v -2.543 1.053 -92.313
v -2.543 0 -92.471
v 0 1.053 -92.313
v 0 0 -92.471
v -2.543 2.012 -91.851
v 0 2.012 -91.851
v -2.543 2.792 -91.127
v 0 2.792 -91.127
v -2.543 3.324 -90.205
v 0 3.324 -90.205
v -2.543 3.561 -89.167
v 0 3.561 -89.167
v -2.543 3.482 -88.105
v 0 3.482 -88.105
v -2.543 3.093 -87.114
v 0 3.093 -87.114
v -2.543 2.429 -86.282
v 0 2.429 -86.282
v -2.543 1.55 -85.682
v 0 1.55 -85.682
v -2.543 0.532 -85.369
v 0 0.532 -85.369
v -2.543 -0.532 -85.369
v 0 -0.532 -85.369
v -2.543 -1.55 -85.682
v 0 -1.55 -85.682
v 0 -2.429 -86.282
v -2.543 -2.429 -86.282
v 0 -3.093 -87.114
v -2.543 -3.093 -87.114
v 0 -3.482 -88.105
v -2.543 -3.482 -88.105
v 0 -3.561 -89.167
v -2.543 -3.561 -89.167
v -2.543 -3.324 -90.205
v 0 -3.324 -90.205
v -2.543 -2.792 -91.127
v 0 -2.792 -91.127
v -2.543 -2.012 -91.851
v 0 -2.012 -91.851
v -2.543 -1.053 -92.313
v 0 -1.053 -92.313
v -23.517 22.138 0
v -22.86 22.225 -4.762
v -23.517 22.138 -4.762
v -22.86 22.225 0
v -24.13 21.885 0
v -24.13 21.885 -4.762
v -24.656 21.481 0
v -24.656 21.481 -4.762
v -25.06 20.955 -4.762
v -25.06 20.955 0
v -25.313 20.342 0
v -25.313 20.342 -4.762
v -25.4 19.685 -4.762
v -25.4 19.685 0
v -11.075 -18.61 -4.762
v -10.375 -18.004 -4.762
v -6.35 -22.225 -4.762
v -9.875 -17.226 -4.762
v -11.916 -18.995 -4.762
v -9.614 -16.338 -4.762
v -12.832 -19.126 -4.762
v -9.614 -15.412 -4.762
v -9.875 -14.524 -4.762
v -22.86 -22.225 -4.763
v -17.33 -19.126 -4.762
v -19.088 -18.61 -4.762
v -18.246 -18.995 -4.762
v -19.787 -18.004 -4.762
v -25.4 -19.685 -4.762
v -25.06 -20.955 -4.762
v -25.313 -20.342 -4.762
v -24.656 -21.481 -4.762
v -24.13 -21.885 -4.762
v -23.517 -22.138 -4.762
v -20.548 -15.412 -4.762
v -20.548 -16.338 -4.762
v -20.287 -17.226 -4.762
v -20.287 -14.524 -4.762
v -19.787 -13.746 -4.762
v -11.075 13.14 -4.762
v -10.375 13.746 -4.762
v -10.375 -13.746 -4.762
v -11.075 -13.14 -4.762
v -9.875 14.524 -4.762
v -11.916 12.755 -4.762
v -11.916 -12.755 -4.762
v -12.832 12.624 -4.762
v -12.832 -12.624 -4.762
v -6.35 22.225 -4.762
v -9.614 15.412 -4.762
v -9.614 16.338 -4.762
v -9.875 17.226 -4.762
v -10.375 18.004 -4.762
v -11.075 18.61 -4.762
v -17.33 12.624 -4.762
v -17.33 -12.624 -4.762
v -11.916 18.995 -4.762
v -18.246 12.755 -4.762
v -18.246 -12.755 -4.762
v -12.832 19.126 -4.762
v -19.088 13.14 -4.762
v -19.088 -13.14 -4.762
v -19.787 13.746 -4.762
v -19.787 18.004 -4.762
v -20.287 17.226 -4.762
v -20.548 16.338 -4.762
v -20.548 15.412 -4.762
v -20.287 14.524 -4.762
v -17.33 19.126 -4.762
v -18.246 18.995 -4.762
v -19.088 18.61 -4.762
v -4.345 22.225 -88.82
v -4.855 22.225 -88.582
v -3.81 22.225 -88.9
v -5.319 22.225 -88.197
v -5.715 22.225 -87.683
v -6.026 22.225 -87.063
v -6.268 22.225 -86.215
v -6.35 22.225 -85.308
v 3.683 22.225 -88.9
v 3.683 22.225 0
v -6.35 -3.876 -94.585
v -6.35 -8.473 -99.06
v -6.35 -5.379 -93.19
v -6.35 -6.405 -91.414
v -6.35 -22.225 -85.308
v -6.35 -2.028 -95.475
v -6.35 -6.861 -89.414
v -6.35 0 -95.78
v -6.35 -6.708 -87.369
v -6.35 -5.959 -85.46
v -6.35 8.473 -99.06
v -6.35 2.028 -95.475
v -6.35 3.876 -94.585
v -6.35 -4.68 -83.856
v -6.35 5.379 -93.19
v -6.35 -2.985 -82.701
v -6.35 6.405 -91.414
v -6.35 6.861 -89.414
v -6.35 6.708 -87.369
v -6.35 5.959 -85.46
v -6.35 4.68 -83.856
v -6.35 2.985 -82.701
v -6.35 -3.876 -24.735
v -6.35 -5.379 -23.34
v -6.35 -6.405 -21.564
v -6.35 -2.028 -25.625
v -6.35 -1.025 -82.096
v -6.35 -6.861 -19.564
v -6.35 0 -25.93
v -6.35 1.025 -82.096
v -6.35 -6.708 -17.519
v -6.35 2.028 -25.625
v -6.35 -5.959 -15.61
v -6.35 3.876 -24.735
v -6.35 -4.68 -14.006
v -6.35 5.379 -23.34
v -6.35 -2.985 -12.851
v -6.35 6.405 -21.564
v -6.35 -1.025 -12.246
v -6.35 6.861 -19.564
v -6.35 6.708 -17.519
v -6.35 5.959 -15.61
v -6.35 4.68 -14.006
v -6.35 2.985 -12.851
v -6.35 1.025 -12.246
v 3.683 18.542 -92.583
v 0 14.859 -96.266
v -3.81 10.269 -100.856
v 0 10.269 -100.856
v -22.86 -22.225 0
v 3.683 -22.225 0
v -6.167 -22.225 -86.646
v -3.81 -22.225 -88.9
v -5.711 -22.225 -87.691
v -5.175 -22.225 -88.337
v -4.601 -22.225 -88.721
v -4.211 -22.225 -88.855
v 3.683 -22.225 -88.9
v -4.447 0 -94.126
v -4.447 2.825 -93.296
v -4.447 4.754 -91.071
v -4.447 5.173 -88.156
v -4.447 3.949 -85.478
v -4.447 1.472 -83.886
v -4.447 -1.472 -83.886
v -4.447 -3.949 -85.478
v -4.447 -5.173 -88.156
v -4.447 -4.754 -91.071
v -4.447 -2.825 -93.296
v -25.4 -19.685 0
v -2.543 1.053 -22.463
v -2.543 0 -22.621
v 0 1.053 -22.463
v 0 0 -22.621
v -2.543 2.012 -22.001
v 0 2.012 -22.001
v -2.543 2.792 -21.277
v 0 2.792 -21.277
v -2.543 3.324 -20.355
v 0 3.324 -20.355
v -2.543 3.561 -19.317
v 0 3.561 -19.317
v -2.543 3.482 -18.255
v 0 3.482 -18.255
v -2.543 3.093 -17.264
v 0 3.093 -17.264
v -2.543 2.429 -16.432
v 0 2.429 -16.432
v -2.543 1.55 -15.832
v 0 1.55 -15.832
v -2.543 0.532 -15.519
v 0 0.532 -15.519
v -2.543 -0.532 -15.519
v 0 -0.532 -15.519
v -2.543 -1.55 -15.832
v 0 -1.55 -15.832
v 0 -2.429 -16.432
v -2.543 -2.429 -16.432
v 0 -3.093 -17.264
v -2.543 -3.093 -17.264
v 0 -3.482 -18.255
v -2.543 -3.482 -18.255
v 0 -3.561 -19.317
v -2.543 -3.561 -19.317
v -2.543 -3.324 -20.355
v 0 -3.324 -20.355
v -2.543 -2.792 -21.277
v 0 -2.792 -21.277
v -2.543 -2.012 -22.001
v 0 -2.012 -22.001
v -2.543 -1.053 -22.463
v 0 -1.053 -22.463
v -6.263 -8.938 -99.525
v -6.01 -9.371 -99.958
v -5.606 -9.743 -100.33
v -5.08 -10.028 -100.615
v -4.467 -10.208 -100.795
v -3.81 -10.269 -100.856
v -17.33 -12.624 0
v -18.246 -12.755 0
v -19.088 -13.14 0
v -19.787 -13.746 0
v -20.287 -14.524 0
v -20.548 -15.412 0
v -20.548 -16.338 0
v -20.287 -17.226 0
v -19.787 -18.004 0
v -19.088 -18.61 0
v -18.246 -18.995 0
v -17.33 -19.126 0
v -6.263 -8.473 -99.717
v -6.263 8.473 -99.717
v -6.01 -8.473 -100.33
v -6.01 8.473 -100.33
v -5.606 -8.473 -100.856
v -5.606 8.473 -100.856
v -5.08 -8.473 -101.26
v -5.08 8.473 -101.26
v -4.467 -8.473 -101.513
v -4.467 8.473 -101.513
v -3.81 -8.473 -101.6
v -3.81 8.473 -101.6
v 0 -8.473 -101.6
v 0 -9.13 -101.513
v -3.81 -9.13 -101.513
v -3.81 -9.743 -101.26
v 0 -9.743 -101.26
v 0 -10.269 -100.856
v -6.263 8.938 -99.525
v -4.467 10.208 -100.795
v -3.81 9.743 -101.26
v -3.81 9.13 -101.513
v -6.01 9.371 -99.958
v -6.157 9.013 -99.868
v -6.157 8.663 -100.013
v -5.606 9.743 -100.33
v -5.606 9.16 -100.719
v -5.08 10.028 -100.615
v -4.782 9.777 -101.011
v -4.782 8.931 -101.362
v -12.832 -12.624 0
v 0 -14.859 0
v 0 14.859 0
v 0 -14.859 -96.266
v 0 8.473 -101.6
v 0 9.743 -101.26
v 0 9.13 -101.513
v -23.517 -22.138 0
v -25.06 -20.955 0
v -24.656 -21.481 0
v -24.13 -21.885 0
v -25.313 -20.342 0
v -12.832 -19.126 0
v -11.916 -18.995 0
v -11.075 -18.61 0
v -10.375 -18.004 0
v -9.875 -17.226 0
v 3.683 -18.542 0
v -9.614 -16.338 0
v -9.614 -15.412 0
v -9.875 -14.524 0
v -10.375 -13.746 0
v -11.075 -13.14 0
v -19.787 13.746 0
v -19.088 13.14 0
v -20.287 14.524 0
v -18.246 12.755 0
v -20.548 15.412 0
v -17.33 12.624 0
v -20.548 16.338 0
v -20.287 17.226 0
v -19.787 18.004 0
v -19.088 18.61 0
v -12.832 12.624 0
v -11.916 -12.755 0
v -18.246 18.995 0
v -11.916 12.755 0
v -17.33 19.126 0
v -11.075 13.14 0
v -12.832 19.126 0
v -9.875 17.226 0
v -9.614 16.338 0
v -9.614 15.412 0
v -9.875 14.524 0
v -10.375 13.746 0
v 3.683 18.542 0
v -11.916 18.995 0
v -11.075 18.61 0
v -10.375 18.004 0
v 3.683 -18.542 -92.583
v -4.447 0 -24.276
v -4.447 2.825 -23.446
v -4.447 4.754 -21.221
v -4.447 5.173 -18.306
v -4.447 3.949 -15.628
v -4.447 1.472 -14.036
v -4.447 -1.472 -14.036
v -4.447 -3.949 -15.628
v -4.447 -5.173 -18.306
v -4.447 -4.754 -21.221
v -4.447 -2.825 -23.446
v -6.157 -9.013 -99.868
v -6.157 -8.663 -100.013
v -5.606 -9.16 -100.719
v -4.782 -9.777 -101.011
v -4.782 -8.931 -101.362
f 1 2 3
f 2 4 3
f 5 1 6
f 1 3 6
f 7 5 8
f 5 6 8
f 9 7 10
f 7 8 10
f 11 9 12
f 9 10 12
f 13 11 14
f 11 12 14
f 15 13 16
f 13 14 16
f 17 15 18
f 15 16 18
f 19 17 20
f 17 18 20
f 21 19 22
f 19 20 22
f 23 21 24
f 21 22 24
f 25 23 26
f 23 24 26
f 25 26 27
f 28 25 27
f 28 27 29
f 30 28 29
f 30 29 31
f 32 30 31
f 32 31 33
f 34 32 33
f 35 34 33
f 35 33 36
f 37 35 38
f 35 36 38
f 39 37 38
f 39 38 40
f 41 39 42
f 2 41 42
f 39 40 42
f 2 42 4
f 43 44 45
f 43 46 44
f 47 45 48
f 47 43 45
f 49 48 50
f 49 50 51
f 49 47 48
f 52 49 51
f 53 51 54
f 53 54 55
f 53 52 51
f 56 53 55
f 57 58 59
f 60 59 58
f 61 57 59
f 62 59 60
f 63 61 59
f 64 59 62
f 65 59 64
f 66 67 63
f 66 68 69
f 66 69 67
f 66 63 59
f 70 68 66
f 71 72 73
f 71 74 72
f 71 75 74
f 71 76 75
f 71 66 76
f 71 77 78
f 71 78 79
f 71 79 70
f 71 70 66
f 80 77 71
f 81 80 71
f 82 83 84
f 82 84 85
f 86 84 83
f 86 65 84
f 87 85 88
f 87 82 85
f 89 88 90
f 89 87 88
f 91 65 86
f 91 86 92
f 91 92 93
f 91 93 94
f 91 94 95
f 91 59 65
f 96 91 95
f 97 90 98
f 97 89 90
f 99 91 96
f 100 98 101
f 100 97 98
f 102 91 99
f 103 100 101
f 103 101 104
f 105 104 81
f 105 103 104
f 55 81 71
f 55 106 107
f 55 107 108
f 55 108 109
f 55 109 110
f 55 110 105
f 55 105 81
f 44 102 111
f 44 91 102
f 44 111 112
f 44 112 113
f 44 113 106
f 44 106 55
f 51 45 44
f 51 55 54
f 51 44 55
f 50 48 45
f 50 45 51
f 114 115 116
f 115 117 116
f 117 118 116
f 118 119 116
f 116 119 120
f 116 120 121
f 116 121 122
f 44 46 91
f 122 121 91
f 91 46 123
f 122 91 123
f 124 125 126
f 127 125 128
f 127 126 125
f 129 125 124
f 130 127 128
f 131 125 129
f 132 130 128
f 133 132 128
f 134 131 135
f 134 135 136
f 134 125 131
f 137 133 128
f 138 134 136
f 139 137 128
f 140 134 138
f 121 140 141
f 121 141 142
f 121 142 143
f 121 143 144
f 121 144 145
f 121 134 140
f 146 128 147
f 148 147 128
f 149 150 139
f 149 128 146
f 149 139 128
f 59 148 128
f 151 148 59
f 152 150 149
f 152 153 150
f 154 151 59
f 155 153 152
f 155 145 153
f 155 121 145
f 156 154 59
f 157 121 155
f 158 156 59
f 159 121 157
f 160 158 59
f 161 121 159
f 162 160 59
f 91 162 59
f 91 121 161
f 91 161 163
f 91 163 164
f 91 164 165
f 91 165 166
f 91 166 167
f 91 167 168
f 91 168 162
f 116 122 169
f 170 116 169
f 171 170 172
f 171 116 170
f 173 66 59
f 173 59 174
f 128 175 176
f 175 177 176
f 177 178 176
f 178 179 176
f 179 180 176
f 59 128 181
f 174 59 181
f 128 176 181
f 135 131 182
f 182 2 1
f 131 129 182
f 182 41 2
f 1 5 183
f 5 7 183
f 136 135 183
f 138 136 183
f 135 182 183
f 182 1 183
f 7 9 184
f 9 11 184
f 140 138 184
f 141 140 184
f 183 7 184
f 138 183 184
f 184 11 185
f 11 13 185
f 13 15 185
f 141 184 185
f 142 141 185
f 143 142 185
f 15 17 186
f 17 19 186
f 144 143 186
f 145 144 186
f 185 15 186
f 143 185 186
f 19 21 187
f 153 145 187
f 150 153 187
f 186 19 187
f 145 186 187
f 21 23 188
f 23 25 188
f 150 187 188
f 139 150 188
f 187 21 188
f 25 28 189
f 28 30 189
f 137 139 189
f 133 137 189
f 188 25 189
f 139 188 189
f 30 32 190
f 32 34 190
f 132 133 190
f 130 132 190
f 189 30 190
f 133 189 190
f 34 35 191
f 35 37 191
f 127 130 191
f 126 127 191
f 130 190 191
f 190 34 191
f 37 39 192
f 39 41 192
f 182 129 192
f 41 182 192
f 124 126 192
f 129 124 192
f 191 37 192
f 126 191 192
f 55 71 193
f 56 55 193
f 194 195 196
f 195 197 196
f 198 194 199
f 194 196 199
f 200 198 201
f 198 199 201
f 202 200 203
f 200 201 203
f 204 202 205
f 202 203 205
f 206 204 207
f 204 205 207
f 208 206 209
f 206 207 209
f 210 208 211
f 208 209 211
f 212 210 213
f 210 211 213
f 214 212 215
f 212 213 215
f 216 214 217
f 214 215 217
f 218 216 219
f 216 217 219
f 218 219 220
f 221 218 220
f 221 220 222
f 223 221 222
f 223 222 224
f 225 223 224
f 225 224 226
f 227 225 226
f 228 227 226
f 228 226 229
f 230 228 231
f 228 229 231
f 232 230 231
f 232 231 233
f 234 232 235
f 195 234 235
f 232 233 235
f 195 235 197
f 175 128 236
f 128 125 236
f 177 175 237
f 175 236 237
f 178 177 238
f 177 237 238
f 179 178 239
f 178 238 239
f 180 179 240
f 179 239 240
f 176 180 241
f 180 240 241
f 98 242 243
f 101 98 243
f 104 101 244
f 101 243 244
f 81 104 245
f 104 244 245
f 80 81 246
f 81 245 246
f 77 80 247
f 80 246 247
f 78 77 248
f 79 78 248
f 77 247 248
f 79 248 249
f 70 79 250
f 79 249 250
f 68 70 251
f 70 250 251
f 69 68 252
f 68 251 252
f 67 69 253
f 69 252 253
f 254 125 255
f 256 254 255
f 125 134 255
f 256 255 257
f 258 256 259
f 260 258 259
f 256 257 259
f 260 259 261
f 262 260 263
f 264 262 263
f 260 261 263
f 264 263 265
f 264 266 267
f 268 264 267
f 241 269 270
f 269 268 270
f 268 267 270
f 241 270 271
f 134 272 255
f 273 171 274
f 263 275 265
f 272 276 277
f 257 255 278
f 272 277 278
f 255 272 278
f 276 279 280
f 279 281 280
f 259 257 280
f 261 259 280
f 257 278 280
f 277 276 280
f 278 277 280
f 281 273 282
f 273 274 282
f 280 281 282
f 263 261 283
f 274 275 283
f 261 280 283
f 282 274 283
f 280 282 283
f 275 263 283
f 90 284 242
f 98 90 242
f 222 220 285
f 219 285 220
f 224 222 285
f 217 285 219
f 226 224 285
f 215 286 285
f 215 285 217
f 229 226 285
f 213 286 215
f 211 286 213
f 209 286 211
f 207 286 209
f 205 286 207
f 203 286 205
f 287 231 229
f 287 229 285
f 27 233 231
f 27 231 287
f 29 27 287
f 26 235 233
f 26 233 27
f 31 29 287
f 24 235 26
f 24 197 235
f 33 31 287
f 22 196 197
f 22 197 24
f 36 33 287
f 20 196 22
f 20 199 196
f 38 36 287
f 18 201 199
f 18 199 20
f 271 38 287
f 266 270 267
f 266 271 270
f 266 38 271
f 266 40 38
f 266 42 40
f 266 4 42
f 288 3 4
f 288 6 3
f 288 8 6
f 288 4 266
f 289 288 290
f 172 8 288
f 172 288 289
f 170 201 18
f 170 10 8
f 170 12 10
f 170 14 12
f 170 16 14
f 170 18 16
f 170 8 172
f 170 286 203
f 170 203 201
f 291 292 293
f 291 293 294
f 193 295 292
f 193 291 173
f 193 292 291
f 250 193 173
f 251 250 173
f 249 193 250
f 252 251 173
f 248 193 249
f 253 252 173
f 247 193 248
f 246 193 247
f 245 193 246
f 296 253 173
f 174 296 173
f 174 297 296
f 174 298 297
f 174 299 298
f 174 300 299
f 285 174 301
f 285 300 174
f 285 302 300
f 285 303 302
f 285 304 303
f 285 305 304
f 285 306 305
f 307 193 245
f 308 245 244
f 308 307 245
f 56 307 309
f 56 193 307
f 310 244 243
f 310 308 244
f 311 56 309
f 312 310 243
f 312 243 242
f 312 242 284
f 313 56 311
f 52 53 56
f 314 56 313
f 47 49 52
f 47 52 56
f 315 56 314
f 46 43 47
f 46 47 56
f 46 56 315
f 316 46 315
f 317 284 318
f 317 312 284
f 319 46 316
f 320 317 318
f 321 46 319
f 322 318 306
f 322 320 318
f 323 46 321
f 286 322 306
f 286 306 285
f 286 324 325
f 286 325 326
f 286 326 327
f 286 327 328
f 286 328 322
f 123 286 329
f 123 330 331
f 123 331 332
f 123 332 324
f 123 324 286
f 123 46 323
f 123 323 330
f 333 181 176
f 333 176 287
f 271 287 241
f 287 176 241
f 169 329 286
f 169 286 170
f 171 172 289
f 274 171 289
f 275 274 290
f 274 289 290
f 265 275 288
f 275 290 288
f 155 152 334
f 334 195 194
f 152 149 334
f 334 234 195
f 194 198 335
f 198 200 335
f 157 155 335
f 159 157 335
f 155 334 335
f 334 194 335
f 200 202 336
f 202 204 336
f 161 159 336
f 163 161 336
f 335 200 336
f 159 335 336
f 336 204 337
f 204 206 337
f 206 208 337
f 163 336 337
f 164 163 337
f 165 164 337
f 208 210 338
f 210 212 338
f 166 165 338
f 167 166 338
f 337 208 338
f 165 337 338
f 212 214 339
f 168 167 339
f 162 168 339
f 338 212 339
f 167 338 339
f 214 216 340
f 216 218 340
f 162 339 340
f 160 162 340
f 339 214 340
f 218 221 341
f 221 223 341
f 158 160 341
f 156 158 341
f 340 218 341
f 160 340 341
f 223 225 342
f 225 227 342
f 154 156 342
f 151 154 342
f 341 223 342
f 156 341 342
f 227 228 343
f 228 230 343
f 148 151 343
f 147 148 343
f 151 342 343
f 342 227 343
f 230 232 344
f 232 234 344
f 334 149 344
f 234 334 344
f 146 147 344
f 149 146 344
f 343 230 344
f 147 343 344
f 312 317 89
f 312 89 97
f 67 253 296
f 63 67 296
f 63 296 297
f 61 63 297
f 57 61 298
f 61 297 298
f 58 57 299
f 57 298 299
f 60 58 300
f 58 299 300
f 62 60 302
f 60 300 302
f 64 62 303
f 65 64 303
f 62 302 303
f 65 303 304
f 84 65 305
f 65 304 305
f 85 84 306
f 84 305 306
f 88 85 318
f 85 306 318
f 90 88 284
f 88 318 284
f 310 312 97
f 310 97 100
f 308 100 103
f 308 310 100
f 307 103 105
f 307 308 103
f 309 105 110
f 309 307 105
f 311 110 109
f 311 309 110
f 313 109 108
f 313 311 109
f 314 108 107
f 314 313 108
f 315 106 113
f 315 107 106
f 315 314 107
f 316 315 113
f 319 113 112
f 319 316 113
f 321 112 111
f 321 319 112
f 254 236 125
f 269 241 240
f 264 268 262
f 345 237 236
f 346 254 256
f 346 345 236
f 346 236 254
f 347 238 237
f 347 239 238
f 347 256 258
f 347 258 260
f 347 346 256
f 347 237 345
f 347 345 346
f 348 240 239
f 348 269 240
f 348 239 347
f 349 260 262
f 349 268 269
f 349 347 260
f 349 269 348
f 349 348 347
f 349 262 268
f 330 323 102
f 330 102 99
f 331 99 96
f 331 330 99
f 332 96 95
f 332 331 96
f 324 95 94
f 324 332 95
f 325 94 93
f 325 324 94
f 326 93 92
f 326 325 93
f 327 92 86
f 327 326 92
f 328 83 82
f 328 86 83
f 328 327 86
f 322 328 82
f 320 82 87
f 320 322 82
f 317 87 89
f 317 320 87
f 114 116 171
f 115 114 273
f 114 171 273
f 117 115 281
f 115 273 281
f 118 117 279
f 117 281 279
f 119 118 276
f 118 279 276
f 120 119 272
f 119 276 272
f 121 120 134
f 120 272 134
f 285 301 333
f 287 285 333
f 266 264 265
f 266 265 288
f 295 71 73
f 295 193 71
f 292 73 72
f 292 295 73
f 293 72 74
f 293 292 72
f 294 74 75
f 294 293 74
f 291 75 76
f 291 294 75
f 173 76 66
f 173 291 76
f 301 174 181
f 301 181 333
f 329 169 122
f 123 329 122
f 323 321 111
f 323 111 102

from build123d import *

# Parameters (mm, degrees)
BOSS_EXTRUDE1_DEPTH                              = 22.225
SKETCH2_W                                        = 3.683
SKETCH2_H                                        = 3.683
BOSS_EXTRUDE2_DEPTH                              = 101.6
CUT_EXTRUDE1_DEPTH                               = 108.059192156
FILLET1_R                                        = 2.54
CSK_FOR_1_4_FLAT_HEAD_MACHINE_SCREW1_D           = 7.14248
CSK_FOR_1_4_FLAT_HEAD_MACHINE_SCREW1_CSINK_D     = 13.7609834
CSK_FOR_1_4_FLAT_HEAD_MACHINE_SCREW1_CSINK_ANGLE = 82
CUT_EXTRUDE2_DEPTH                               = 106.732743864
FILLET2_R                                        = 2.54
CHAMFER1_SIZE                                    = 3.683


with BuildPart() as part:
    # Sketch1 → Boss-Extrude1 (new, symmetric)
    with BuildSketch(Plane(origin=(0, 0, 0), x_dir=(1, 0, 0), z_dir=(0, 1, 0))):
        Polygon((0, 0), (0, 101.6), (-6.35, 101.6), (-6.35, 4.7625), (-25.4, 4.7625), (-25.4, 0), align=None)
    extrude(amount=BOSS_EXTRUDE1_DEPTH, both=True)

    # Sketch2 → Boss-Extrude2 (add)
    with BuildSketch(Plane.XY):
        with Locations((1.8415, 20.3835)):
            Rectangle(SKETCH2_W, SKETCH2_H)
        with Locations((1.8415, -20.3835)):
            Rectangle(SKETCH2_W, SKETCH2_H)
    extrude(amount=-BOSS_EXTRUDE2_DEPTH)

    # Sketch3 → Cut-Extrude1 (cut, through all)
    with BuildSketch(Plane.XY):
        with BuildLine():
            Line((-17.33005, 19.1262), (-12.83245, 19.1262))
            ThreePointArc((-12.83245, 19.1262), (-9.58125, 15.875), (-12.83245, 12.6238))
            Line((-12.83245, 12.6238), (-17.33005, 12.6238))
            ThreePointArc((-17.33005, 12.6238), (-20.58125, 15.875), (-17.33005, 19.1262))
        make_face()
        with BuildLine():
            Line((-17.33005, -19.1262), (-12.83245, -19.1262))
            ThreePointArc((-12.83245, -19.1262), (-9.58125, -15.875), (-12.83245, -12.6238))
            Line((-12.83245, -12.6238), (-17.33005, -12.6238))
            ThreePointArc((-17.33005, -12.6238), (-20.58125, -15.875), (-17.33005, -19.1262))
        make_face()
    extrude(amount=-CUT_EXTRUDE1_DEPTH, mode=Mode.SUBTRACT)

    # Fillet1
    fillet1_edges = [part.edges().sort_by_distance(p)[0] for p in [
        (-25.4, 22.225, -2.38125),
        (-25.4, -22.225, -2.38125),
    ]]
    fillet(fillet1_edges, radius=FILLET1_R)

    # CSK for 1/4 Flat Head Machine Screw1 (through all)
    with Locations(Plane.ZY.offset(6.35)):
        with Locations((-19.05, 0), (-88.9, 0)):
            CounterSinkHole(CSK_FOR_1_4_FLAT_HEAD_MACHINE_SCREW1_D / 2, CSK_FOR_1_4_FLAT_HEAD_MACHINE_SCREW1_CSINK_D / 2, counter_sink_angle=CSK_FOR_1_4_FLAT_HEAD_MACHINE_SCREW1_CSINK_ANGLE)

    # Sketch6 → Cut-Extrude2 (cut, through all)
    with BuildSketch(Plane.ZY.offset(6.35)):
        Polygon((-101.6, 22.225), (-88.9, 22.225), (-101.6, 9.525), align=None)
        Polygon((-88.9, -22.225), (-101.6, -9.525), (-101.6, -22.225), align=None)
    extrude(amount=-CUT_EXTRUDE2_DEPTH, mode=Mode.SUBTRACT)

    # Fillet2
    fillet2_edges = [part.edges().sort_by_distance(p)[0] for p in [
        (-6.35, 0, -101.6),
        (-3.175, 9.525, -101.6),
        (-6.35, 15.875, -95.25),
        (-3.175, -9.525, -101.6),
        (-6.35, -15.875, -95.25),
    ]]
    fillet(fillet2_edges, radius=FILLET2_R)

    # Chamfer1
    chamfer1_edges = [part.edges().sort_by_distance(p)[0] for p in [
        (0, -18.542, -46.2915),
        (0, 18.542, -46.2915),
    ]]
    chamfer(chamfer1_edges, length=CHAMFER1_SIZE - 0.0001)  # a hair under: the kernel refuses the full size


solid = part.part
